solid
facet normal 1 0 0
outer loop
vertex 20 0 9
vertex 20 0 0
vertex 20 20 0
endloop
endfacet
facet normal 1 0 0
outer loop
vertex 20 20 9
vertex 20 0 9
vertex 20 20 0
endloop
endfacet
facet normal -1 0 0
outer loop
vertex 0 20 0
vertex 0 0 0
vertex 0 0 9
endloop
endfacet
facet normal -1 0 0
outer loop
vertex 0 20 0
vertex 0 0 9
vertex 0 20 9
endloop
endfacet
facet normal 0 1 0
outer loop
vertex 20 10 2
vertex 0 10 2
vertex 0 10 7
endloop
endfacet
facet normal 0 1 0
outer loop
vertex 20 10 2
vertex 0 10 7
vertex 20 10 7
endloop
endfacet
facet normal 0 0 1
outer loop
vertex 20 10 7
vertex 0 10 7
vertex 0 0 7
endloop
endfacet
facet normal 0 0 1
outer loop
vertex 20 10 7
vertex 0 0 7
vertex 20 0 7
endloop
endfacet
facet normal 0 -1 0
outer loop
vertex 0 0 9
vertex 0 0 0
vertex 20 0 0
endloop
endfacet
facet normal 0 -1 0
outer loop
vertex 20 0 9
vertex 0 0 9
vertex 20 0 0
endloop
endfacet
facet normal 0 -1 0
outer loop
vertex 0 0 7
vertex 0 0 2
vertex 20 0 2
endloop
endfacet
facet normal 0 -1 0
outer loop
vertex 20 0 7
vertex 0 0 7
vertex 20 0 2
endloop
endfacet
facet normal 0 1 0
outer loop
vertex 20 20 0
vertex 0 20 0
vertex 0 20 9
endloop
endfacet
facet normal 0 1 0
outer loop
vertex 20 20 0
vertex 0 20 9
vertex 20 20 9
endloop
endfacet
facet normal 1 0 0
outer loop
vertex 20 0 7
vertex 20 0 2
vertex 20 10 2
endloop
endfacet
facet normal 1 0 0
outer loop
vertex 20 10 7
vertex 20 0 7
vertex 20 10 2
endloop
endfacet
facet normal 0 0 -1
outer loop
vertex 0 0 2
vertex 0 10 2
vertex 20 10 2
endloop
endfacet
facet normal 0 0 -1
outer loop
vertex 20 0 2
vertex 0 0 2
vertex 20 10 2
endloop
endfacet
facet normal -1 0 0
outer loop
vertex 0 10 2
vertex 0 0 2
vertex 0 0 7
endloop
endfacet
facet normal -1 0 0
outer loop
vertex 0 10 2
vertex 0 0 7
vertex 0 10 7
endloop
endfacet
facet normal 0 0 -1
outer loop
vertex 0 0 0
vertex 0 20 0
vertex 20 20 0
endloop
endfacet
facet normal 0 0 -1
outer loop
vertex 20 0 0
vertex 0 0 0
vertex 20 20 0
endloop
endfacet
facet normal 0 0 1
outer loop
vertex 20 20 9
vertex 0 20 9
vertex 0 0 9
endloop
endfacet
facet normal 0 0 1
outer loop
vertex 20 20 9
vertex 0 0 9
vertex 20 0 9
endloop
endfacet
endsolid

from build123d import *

# Parameters (mm, degrees)
BOX_W        = 20
BOX_H        = 20
BOX_DEPTH    = 9
BOX001_W     = 20
BOX001_H     = 10
BOX001_DEPTH = 5


with BuildPart() as cube:
    # Box → Box (new body)
    with BuildSketch(Plane.XY):
        with Locations((10, 10)):
            Rectangle(BOX_W, BOX_H)
    extrude(amount=BOX_DEPTH)


with BuildPart() as cube001:
    # Box001 → Box001 (new body)
    with BuildSketch(Plane.XY.offset(2)):
        with Locations((10, 5)):
            Rectangle(BOX001_W, BOX001_H)
    extrude(amount=BOX001_DEPTH)


solid = Compound([cube.part, cube001.part])
